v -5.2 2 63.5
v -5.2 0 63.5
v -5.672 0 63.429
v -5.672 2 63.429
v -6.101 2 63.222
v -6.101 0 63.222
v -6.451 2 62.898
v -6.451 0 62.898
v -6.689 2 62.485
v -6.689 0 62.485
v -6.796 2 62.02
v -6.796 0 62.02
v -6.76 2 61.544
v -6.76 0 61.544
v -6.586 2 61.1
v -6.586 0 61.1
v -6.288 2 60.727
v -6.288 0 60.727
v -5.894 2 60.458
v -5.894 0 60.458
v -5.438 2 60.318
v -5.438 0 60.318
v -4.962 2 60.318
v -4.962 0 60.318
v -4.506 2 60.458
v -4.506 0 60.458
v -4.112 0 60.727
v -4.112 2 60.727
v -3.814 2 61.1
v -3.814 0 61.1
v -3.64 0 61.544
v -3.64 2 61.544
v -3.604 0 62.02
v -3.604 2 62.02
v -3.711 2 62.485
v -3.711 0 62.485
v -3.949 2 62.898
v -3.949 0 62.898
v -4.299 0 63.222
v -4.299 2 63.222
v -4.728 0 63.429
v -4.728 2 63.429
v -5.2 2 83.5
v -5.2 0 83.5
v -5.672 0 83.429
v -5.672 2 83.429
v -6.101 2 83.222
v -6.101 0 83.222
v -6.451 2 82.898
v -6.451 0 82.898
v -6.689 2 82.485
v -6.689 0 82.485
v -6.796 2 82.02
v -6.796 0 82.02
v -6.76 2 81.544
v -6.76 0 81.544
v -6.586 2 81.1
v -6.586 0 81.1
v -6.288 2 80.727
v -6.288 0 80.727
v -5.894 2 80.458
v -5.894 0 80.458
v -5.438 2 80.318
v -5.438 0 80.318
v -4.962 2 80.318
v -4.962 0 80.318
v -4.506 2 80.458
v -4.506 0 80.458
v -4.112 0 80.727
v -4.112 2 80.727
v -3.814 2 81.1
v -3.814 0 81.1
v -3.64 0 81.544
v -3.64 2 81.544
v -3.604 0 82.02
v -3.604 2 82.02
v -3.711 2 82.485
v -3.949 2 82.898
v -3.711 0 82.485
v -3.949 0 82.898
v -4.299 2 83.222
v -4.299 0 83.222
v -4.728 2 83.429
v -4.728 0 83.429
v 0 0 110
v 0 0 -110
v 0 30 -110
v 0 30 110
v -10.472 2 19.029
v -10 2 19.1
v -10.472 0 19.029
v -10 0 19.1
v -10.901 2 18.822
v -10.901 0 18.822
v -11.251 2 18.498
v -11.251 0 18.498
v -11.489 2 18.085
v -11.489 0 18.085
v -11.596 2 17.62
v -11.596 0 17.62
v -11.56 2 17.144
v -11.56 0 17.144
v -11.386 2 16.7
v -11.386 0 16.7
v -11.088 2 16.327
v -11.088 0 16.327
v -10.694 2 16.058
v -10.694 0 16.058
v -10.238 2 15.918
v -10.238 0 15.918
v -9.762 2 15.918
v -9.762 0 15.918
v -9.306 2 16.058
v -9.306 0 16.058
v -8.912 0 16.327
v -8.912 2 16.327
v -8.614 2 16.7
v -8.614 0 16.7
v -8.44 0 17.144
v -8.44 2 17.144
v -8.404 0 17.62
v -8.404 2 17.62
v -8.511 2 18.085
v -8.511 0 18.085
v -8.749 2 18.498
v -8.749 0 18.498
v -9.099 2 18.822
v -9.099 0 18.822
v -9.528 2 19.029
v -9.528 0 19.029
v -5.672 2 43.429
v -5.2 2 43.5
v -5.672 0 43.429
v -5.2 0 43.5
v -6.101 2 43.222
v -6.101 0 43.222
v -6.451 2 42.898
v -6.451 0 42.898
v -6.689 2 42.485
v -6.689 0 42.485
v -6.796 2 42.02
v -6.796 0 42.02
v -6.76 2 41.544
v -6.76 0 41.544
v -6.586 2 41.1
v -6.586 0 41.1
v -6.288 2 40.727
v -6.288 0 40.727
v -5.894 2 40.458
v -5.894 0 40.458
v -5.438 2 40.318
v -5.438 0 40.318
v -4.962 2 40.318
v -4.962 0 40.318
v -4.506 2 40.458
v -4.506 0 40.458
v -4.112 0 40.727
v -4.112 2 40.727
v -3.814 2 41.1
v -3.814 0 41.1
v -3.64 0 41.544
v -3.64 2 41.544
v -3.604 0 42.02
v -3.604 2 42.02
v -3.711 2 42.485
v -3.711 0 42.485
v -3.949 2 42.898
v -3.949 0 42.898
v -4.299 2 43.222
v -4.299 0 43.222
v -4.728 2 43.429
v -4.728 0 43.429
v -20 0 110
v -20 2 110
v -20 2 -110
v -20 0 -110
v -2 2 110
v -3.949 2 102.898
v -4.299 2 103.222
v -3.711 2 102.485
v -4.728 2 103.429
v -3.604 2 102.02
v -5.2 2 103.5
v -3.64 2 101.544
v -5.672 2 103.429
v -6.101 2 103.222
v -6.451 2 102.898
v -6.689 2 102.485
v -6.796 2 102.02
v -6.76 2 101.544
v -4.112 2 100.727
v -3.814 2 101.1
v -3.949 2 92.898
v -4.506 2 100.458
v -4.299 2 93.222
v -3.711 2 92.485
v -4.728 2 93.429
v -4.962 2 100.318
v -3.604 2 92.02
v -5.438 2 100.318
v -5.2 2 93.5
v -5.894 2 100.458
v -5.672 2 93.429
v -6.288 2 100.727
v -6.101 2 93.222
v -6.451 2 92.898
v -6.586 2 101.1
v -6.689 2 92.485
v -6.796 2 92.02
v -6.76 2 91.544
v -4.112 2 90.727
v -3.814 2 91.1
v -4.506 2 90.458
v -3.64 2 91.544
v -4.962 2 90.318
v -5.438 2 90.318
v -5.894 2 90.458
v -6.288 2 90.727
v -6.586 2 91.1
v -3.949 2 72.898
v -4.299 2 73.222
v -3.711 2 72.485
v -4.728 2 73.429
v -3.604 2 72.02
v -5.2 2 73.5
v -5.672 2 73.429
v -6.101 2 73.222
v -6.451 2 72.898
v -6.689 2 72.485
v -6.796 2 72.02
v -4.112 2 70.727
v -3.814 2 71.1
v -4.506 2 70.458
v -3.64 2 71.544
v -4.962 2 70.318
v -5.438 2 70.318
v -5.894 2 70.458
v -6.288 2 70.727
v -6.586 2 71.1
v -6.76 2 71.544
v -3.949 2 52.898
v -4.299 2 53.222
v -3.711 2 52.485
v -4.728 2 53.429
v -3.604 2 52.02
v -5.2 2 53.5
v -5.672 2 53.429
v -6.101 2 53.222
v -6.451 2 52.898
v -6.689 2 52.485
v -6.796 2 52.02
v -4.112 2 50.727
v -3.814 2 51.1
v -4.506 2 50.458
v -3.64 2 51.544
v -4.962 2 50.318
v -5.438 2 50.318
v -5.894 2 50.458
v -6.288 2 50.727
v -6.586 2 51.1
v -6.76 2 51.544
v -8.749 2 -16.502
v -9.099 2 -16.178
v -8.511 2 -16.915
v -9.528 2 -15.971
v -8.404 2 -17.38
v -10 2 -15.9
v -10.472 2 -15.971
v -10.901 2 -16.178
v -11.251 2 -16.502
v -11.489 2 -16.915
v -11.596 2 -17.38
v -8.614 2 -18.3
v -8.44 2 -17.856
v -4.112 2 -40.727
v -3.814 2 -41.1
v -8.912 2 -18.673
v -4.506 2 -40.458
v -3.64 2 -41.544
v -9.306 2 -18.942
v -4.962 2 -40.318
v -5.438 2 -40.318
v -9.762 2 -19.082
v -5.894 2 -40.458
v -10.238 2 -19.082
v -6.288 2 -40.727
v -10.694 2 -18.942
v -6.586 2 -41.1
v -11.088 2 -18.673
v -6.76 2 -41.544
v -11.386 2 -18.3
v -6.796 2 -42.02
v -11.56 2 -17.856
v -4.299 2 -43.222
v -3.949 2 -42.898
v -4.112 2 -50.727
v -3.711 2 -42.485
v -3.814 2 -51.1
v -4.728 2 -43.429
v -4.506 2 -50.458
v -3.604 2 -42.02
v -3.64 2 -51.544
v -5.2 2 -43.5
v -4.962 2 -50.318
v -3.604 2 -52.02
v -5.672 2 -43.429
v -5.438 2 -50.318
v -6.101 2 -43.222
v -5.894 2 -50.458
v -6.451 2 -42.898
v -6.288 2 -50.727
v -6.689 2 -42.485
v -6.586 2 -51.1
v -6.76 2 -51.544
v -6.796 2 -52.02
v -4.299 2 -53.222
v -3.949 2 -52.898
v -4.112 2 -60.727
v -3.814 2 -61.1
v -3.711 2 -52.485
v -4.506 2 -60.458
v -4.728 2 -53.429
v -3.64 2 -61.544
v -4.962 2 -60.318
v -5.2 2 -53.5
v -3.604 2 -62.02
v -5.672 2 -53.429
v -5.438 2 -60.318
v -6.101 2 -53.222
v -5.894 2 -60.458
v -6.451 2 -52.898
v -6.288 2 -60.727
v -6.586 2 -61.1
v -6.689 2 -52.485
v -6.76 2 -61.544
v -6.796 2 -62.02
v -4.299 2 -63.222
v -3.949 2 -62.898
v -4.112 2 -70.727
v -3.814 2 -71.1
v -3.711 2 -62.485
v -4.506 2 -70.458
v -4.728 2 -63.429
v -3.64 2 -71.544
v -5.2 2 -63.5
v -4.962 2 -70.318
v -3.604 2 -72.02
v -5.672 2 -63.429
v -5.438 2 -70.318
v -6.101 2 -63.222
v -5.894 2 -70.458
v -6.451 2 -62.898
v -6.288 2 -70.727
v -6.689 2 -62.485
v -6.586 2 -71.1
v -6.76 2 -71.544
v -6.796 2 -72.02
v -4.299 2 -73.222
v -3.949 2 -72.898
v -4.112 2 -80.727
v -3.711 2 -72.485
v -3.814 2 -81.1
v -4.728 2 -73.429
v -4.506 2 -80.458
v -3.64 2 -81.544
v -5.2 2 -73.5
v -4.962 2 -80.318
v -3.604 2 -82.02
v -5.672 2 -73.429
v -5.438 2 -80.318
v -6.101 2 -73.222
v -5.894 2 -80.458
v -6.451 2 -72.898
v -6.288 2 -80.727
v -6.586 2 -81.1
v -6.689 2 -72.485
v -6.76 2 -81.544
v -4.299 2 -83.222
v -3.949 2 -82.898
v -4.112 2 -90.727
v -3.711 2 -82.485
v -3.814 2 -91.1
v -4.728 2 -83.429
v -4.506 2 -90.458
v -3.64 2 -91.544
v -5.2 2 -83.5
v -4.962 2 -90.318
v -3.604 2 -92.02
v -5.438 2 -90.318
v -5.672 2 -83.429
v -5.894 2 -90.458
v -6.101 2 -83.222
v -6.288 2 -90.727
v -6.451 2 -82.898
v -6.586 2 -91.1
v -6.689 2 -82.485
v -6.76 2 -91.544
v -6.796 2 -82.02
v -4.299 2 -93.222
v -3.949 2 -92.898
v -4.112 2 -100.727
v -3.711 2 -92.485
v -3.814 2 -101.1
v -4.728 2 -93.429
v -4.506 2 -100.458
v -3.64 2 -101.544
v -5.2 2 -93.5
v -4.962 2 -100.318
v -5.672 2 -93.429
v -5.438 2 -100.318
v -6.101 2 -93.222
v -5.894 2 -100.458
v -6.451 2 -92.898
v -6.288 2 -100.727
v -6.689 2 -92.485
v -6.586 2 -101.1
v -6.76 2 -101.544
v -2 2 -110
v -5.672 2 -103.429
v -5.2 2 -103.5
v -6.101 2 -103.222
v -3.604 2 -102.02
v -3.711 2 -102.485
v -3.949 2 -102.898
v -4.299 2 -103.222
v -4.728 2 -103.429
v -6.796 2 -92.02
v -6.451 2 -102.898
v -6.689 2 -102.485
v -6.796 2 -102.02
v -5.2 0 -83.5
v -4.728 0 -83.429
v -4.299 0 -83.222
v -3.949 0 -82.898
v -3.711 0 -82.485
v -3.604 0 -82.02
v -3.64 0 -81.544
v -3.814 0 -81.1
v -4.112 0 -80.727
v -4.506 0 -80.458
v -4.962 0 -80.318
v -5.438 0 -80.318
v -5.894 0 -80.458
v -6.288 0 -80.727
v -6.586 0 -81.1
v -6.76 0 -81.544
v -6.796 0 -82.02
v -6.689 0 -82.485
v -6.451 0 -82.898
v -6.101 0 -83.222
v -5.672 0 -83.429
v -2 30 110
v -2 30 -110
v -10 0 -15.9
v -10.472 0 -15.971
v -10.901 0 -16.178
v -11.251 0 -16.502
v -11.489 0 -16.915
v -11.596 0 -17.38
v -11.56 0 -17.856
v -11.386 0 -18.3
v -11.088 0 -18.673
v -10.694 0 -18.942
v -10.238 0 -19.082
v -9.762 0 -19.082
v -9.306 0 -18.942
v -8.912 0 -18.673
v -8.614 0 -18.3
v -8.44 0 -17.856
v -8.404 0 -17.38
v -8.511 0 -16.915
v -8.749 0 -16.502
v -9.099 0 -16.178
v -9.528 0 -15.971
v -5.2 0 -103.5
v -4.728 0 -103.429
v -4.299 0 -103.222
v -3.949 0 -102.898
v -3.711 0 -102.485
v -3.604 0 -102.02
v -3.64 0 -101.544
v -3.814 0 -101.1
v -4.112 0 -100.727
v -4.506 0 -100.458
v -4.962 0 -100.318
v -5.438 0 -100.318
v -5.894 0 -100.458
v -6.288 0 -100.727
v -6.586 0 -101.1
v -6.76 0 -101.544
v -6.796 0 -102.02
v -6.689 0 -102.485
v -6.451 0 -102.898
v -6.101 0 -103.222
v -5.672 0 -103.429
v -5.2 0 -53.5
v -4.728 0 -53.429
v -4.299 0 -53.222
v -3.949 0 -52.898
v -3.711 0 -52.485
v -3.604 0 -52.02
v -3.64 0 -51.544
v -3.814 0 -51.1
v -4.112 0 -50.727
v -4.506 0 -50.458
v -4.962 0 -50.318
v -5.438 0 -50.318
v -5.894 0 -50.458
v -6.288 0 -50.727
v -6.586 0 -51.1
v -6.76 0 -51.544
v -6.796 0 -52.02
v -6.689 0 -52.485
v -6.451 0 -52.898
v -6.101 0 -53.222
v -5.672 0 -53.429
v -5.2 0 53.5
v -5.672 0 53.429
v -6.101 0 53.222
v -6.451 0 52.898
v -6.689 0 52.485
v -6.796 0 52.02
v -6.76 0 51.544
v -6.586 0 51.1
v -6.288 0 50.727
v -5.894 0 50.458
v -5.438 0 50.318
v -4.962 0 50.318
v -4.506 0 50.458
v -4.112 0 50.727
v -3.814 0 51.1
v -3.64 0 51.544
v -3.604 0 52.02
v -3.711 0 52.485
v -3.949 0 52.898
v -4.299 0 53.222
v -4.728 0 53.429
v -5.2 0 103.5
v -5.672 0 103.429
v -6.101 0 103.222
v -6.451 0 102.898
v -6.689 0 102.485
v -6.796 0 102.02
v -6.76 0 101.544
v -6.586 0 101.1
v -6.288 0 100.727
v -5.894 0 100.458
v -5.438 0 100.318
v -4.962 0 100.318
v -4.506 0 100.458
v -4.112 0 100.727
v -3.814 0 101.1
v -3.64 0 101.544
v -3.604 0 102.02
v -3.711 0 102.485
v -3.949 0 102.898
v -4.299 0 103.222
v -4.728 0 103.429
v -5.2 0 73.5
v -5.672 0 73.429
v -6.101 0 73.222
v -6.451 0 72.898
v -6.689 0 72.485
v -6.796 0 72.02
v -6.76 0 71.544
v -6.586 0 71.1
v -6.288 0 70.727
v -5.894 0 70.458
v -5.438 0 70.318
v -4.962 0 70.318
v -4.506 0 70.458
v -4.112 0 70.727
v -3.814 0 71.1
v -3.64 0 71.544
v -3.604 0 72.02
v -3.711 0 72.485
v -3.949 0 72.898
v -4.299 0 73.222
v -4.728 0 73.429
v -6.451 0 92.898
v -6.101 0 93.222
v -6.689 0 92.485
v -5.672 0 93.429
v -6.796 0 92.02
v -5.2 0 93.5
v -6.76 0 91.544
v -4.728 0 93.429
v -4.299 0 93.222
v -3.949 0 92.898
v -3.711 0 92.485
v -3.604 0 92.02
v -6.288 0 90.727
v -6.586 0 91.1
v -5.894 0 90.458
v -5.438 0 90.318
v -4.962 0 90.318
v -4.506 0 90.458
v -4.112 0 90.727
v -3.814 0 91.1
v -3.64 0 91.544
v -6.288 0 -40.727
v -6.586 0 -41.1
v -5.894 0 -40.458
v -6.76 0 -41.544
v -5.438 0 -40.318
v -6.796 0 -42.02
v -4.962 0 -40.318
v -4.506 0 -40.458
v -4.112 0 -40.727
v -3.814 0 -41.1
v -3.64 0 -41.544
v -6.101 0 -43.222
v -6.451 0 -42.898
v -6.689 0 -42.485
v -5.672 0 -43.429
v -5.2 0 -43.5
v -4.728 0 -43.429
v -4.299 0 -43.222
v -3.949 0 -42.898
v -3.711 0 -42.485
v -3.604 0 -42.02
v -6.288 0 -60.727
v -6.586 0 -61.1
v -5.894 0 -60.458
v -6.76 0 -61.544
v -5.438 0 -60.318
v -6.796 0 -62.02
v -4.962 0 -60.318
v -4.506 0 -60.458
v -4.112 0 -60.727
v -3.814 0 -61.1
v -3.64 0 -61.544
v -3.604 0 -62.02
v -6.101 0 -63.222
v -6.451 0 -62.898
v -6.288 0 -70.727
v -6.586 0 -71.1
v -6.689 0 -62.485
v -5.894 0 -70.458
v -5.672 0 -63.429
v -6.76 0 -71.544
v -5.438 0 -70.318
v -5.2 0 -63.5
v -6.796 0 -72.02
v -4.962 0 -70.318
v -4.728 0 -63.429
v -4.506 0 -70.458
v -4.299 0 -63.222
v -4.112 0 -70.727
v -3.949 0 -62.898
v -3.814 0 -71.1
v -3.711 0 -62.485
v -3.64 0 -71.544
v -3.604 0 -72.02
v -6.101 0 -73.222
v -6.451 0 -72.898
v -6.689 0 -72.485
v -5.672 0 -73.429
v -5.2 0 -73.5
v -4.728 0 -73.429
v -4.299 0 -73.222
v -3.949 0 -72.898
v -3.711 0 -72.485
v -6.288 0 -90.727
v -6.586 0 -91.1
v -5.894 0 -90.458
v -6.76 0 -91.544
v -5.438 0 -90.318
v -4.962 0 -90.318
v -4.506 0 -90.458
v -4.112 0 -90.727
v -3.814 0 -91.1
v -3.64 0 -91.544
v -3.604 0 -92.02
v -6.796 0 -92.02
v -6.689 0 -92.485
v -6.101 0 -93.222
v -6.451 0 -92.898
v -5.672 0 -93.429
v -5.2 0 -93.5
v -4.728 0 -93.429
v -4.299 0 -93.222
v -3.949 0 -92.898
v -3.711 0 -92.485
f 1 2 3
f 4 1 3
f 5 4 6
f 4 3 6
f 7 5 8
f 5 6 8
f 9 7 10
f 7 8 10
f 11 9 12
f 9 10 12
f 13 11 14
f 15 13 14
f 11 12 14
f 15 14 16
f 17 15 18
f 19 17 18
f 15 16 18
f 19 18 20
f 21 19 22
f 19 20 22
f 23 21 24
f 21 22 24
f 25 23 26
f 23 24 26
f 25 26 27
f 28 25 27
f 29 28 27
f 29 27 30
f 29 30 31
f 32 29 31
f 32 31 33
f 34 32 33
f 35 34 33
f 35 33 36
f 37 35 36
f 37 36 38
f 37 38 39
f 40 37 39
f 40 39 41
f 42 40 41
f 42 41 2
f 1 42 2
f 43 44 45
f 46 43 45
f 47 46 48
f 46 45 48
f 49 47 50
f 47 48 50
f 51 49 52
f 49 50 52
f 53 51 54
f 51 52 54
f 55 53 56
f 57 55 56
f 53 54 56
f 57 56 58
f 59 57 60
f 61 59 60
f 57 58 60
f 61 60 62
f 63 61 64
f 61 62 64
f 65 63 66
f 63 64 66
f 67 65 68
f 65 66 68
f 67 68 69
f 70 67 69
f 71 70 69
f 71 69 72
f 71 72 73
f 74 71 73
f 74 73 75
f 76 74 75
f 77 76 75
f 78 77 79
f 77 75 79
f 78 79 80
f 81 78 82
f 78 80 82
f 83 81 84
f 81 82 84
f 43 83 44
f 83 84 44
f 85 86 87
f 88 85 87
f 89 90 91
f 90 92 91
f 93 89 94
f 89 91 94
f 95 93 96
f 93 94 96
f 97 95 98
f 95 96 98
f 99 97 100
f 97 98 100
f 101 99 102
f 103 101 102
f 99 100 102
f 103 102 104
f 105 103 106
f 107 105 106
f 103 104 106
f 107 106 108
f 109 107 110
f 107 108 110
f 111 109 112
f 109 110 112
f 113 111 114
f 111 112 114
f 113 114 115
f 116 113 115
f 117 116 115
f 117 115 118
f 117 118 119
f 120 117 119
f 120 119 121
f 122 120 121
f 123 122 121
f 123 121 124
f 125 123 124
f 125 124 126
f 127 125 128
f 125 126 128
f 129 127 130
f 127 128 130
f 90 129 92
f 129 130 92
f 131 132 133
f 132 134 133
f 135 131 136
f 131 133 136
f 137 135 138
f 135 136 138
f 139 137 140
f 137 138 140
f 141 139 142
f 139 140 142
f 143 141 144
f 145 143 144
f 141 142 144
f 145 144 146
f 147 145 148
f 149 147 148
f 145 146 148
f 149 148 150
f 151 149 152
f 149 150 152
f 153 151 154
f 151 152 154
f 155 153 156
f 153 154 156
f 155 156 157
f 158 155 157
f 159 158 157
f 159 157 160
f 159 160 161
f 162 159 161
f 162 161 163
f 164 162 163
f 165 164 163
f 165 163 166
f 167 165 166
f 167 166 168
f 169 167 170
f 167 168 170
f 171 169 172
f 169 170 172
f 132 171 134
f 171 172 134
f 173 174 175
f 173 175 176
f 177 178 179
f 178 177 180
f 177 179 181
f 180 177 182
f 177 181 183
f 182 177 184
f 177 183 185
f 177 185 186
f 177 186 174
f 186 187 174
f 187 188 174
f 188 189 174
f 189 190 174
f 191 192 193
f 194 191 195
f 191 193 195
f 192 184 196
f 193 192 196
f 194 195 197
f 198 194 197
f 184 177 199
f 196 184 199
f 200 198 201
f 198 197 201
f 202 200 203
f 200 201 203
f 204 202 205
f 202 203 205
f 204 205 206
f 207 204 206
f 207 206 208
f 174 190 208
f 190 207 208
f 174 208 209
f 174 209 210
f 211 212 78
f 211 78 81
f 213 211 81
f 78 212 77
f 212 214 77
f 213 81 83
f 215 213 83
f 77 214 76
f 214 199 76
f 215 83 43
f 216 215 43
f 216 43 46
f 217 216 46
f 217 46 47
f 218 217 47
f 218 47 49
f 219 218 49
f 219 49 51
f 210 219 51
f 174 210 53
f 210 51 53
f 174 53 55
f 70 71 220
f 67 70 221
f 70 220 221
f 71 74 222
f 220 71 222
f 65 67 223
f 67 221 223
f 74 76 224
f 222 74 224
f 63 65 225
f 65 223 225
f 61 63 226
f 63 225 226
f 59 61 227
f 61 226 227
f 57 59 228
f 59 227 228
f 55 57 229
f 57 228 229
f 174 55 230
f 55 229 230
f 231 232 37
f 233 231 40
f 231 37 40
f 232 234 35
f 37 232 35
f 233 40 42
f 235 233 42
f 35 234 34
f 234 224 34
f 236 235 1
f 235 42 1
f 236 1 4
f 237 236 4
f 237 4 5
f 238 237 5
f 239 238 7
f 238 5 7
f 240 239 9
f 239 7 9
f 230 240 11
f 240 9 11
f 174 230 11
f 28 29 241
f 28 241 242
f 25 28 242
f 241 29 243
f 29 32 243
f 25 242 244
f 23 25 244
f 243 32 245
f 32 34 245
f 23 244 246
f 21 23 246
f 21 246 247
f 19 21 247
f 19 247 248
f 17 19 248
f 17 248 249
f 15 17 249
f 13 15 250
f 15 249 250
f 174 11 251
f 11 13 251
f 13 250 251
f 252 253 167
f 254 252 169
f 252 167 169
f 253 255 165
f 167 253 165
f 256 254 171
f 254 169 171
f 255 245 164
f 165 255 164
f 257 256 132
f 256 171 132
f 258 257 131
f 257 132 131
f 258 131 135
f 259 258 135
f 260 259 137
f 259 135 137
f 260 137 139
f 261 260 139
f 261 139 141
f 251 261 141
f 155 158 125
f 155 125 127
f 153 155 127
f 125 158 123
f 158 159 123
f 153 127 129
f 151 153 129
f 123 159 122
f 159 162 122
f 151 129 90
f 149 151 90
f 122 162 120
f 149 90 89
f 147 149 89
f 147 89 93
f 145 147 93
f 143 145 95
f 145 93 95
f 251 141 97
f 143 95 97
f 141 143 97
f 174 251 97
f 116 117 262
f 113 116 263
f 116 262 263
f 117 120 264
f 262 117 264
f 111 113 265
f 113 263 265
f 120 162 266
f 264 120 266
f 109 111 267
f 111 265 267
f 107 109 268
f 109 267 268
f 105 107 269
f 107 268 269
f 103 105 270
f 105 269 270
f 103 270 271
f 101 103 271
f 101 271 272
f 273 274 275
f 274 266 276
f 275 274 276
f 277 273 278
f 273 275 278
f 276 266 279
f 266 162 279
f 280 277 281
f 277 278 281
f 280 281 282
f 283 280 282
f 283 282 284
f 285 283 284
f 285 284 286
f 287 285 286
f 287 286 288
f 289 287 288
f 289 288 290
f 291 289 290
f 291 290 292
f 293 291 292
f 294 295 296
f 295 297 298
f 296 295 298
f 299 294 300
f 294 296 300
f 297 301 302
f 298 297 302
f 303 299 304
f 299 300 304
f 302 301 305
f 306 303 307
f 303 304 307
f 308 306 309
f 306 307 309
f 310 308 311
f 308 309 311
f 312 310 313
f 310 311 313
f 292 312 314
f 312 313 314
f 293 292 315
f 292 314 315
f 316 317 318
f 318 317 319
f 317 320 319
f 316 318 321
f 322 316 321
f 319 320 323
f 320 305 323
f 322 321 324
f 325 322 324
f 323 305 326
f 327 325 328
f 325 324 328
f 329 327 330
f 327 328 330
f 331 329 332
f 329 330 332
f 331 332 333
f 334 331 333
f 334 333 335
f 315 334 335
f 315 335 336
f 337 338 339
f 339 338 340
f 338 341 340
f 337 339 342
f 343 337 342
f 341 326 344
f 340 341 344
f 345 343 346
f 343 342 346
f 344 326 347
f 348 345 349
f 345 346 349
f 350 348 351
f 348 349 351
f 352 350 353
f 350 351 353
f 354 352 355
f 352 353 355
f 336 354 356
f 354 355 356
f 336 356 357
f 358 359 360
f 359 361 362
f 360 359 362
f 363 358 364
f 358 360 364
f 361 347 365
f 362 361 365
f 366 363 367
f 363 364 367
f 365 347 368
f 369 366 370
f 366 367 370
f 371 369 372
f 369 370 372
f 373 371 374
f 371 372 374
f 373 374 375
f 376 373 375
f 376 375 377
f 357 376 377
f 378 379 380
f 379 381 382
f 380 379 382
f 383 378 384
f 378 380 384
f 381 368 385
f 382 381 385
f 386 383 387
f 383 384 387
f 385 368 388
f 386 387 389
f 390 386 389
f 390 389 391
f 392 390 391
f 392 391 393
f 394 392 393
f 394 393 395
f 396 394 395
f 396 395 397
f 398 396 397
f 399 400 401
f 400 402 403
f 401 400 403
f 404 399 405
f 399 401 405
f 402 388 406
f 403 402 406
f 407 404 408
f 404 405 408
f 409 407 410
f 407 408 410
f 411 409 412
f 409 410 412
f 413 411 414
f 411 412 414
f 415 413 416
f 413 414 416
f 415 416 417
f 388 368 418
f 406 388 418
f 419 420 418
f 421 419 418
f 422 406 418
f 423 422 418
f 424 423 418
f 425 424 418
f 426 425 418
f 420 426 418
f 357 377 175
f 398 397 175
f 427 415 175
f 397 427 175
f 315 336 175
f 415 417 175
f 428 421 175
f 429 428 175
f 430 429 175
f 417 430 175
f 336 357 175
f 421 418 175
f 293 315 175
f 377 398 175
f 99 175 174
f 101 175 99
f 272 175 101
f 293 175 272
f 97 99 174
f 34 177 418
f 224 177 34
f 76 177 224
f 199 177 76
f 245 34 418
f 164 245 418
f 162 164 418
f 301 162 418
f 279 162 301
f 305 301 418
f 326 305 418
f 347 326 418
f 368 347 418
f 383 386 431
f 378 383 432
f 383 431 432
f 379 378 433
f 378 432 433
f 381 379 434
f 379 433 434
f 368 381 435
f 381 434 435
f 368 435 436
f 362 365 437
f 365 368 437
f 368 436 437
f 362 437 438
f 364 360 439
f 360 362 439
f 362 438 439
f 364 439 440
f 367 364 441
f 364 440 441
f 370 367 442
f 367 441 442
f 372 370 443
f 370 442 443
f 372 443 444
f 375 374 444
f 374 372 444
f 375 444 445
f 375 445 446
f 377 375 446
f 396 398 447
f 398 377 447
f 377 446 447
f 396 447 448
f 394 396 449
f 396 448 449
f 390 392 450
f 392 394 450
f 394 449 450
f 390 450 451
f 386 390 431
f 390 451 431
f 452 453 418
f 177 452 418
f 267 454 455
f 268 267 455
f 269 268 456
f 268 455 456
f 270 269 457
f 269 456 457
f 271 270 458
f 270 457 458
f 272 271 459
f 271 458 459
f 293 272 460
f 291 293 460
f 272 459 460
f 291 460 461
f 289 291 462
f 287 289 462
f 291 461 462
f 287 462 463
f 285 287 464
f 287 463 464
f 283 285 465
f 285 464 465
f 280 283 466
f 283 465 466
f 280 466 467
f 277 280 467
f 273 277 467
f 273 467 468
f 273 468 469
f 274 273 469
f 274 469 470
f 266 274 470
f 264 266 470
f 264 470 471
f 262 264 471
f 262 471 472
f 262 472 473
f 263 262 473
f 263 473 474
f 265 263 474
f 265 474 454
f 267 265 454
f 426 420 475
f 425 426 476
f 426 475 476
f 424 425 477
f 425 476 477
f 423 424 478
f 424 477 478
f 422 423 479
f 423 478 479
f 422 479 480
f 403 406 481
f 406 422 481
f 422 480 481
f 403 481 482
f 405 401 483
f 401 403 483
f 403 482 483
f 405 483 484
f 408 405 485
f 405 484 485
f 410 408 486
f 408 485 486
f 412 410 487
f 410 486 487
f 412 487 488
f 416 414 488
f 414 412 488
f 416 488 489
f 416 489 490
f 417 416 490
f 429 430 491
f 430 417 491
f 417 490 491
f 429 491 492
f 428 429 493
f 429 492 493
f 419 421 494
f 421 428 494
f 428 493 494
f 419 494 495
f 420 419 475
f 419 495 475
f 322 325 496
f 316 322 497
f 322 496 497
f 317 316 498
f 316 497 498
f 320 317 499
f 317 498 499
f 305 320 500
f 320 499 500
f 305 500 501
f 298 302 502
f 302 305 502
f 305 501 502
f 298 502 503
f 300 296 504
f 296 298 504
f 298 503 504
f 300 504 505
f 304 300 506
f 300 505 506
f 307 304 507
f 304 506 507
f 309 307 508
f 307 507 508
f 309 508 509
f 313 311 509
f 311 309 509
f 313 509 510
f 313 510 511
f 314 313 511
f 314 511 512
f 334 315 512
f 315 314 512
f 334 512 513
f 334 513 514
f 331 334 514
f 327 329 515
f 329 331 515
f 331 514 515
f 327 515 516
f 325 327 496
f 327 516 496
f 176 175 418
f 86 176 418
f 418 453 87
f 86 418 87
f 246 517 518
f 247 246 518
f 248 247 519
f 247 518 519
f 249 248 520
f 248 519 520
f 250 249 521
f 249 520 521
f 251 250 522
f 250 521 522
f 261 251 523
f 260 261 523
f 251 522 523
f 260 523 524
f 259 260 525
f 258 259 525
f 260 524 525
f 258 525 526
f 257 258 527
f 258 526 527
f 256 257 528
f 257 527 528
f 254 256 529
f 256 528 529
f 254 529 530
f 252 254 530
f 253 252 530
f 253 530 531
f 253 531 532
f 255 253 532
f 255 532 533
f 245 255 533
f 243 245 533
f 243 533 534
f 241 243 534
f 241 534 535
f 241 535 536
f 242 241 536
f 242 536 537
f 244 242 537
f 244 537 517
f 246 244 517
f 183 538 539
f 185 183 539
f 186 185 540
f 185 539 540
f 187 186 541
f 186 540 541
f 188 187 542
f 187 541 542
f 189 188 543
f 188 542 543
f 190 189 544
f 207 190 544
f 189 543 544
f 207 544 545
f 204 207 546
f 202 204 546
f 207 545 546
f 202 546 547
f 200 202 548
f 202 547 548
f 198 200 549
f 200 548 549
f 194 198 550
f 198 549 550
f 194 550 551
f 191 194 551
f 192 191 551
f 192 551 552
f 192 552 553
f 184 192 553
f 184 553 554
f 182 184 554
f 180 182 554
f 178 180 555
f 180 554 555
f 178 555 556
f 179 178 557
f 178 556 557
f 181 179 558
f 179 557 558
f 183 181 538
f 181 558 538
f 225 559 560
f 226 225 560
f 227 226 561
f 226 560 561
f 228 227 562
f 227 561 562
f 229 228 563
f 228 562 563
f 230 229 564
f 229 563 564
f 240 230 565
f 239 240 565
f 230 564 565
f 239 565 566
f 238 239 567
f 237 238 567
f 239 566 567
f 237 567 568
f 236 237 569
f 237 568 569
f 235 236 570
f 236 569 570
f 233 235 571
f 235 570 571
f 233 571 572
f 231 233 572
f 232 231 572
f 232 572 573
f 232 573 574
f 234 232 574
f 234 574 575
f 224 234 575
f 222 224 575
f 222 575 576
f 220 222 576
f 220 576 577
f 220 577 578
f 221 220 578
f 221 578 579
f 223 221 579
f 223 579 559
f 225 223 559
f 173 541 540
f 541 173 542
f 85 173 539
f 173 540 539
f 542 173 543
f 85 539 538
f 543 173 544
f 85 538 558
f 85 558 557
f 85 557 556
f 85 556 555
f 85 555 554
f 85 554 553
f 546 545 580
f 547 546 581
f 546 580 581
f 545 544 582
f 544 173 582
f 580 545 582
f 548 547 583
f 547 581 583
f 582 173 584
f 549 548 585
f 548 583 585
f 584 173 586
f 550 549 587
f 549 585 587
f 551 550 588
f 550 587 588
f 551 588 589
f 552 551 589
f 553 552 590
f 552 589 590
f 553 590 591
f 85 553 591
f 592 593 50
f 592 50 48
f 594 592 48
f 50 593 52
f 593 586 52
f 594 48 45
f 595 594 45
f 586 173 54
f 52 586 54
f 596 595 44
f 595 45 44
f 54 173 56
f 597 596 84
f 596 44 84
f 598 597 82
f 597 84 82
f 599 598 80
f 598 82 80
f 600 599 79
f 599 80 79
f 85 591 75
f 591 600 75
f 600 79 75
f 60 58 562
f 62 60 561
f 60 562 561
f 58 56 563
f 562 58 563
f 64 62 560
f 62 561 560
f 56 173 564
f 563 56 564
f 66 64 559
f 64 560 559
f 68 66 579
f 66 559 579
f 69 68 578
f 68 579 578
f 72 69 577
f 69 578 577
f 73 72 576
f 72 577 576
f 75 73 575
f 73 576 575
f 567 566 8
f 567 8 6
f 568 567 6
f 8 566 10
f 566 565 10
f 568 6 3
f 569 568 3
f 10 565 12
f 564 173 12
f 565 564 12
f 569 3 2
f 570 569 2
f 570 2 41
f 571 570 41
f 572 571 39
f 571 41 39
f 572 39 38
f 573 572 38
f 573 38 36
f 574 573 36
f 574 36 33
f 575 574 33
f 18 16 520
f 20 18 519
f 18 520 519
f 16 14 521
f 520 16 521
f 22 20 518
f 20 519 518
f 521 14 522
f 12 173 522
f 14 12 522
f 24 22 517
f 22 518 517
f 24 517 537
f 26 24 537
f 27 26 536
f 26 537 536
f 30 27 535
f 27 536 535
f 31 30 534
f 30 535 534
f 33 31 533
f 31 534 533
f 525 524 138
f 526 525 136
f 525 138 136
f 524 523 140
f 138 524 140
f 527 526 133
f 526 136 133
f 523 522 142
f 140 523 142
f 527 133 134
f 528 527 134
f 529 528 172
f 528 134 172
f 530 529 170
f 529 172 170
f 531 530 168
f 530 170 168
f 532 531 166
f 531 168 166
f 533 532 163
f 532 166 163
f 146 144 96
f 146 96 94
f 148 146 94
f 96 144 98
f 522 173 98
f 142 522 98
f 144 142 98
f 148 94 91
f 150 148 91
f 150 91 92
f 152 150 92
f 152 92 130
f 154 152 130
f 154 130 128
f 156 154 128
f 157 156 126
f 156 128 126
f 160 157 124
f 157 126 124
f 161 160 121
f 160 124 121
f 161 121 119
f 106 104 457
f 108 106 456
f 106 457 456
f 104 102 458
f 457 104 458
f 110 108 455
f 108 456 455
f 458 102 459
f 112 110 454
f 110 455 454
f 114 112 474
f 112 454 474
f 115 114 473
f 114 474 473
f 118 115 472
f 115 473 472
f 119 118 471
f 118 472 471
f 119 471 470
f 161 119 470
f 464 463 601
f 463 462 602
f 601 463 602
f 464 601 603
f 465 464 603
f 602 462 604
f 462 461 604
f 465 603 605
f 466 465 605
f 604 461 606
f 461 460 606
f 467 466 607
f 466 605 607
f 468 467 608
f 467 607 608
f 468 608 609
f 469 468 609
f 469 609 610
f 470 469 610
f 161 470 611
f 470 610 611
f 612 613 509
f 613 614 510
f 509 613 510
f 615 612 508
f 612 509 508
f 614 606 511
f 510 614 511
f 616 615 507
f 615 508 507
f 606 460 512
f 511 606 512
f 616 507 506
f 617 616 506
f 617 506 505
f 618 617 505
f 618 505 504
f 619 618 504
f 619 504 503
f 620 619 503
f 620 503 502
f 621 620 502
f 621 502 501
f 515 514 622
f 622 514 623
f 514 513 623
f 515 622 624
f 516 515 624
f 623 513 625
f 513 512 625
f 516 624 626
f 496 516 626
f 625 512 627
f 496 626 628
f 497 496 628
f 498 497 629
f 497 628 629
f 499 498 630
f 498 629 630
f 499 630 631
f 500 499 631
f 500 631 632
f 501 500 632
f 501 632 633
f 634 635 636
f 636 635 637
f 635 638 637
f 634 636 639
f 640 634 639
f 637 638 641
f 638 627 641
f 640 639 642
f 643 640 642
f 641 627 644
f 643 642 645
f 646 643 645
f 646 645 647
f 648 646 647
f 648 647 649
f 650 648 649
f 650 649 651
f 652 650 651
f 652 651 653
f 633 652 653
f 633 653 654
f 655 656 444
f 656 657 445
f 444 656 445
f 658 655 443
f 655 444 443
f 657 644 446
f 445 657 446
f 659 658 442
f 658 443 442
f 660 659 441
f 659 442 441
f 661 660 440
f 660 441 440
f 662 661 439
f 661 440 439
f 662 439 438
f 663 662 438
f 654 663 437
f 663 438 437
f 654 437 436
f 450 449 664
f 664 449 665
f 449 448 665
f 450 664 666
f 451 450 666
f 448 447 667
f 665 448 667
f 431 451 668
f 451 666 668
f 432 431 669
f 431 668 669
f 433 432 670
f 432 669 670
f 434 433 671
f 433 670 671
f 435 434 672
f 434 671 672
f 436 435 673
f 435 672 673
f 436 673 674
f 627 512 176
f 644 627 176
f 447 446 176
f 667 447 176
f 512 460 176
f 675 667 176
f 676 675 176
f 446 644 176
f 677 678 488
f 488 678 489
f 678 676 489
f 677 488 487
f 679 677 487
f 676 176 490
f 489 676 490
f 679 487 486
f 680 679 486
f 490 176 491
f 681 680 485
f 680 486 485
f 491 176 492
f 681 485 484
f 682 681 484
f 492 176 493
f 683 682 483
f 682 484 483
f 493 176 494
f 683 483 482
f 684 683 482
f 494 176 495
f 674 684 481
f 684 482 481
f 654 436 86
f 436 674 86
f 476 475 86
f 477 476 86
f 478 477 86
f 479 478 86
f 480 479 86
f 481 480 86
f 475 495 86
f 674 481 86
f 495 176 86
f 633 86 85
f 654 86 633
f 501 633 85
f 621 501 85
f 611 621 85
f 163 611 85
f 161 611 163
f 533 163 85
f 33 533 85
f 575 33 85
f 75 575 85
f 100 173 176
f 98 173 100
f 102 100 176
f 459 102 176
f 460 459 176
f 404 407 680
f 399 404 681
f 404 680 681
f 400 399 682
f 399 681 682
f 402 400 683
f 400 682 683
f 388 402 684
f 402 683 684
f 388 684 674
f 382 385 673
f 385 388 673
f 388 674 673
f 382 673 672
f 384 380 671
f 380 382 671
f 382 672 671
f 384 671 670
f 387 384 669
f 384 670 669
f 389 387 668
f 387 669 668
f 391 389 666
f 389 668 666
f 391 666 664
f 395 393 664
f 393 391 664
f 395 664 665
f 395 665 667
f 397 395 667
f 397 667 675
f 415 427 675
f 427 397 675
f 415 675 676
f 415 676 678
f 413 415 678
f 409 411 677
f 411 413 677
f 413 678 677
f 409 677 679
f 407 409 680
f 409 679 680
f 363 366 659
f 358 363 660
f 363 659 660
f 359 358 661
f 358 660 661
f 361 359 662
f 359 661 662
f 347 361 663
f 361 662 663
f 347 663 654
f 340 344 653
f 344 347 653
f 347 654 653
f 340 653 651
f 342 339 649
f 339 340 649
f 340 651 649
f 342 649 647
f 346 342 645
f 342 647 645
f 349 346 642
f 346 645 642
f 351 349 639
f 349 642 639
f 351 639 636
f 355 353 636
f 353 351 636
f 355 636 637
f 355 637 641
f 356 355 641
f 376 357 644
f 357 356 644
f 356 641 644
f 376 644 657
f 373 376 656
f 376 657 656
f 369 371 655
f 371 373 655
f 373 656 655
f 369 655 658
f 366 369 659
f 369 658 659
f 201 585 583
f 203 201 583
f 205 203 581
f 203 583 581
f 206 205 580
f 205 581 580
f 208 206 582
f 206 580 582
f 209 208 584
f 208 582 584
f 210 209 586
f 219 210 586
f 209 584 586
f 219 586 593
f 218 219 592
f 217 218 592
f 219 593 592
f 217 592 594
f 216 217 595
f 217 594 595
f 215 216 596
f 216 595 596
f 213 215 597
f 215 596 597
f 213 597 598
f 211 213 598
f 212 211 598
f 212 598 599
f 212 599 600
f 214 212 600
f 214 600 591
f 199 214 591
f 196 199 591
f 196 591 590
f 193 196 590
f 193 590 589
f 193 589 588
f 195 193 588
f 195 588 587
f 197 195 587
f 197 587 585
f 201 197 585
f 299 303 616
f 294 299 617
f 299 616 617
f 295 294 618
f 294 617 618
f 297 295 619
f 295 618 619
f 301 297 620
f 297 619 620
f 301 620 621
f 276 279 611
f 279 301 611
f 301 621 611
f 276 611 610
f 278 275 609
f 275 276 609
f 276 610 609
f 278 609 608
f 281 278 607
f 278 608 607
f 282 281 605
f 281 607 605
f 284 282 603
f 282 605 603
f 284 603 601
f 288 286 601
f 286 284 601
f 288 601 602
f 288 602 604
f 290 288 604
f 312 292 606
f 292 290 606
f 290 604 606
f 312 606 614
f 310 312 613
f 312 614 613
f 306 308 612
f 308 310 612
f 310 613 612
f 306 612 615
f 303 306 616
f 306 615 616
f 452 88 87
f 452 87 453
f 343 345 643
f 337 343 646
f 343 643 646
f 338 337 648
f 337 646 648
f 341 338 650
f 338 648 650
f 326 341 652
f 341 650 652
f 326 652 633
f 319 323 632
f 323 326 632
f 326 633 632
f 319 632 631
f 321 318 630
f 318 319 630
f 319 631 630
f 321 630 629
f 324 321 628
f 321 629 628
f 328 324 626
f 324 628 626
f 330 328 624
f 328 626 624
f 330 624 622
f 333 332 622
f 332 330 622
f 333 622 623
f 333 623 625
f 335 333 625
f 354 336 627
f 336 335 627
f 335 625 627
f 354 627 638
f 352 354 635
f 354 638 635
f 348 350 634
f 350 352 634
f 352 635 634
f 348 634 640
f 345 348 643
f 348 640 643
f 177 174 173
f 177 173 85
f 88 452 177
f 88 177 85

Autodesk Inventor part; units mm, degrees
ref_plane "YZ Plane" through (0, 0, 0) normal (1, 0, 0) x (0, 1, 0)
ref_plane "XZ Plane" through (0, 0, 0) normal (0, 1, 0) x (-1, 0, 0)
ref_plane "XY Plane" through (0, 0, 0) normal (0, 0, 1) x (1, 0, 0)
sketch "Szkic1" plane through (0, 0, 0) normal (0, 0, 1) x (1, 0, 0)
  line L0 (0, 0) -> (0, 30)
  line L1 (0, 30) -> (-2, 30)
  line L2 (-2, 30) -> (-2, 2)
  line L3 (-2, 2) -> (-20, 2)
  line L4 (-20, 2) -> (-20, 0)
  line L5 (-20, 0) -> (0, 0)
  dimension "d0" = 30
  dimension "d1" = 2
  dimension "d2" = 28
  dimension "d4" = 20
extrude "Wyciągnięcie proste1" add sketch "Szkic1" along normal mid plane 220
sketch "Szkic2" plane through (-20, 2, 110) normal (0, 1, 0) x (1, 0, 0)
  line L0 (18, 0) -> (0, 0) projected
  line L1 (20, 0) -> (20, 220) projected
  point P0 (20, 110)
  point P1 (14.8, 8.1)
  dimension "d7" = 8.1
  dimension "d8" = 5.2
hole "Otwór1" at (-5.2, 2, 101.9) direction (0, -1, 0) diameter 3.2 end through all
pattern_linear "Szyk prostokątny1" count 7 spacing 10 along (0, 0, -1) of "Otwór1"
mirror "Odbij1" about plane through (0, 0, 0) normal (0, 0, 1) of "Otwór1", "Szyk prostokątny1"
sketch "Szkic3" plane through (-20, 2, 110) normal (0, 1, 0) x (1, 0, 0)
  line L0 (24, 110) -> (-4, 110) projected
  line L1 (10, 127.5) -> (10, 92.5) construction
  line L2 (20, 220) -> (20, 0) projected
  point P0 (20, 110)
  point P1 (10, 110)
  dimension "d19" = 35
  dimension "d20" = 10
hole "Otwór2" at (-10, 2, -17.5) at (-10, 2, 17.5) direction (0, -1, 0) diameter 3.2 end through all
properties part number "bepf_podwozie_belka_glowna" material "Aluminium 6061"
